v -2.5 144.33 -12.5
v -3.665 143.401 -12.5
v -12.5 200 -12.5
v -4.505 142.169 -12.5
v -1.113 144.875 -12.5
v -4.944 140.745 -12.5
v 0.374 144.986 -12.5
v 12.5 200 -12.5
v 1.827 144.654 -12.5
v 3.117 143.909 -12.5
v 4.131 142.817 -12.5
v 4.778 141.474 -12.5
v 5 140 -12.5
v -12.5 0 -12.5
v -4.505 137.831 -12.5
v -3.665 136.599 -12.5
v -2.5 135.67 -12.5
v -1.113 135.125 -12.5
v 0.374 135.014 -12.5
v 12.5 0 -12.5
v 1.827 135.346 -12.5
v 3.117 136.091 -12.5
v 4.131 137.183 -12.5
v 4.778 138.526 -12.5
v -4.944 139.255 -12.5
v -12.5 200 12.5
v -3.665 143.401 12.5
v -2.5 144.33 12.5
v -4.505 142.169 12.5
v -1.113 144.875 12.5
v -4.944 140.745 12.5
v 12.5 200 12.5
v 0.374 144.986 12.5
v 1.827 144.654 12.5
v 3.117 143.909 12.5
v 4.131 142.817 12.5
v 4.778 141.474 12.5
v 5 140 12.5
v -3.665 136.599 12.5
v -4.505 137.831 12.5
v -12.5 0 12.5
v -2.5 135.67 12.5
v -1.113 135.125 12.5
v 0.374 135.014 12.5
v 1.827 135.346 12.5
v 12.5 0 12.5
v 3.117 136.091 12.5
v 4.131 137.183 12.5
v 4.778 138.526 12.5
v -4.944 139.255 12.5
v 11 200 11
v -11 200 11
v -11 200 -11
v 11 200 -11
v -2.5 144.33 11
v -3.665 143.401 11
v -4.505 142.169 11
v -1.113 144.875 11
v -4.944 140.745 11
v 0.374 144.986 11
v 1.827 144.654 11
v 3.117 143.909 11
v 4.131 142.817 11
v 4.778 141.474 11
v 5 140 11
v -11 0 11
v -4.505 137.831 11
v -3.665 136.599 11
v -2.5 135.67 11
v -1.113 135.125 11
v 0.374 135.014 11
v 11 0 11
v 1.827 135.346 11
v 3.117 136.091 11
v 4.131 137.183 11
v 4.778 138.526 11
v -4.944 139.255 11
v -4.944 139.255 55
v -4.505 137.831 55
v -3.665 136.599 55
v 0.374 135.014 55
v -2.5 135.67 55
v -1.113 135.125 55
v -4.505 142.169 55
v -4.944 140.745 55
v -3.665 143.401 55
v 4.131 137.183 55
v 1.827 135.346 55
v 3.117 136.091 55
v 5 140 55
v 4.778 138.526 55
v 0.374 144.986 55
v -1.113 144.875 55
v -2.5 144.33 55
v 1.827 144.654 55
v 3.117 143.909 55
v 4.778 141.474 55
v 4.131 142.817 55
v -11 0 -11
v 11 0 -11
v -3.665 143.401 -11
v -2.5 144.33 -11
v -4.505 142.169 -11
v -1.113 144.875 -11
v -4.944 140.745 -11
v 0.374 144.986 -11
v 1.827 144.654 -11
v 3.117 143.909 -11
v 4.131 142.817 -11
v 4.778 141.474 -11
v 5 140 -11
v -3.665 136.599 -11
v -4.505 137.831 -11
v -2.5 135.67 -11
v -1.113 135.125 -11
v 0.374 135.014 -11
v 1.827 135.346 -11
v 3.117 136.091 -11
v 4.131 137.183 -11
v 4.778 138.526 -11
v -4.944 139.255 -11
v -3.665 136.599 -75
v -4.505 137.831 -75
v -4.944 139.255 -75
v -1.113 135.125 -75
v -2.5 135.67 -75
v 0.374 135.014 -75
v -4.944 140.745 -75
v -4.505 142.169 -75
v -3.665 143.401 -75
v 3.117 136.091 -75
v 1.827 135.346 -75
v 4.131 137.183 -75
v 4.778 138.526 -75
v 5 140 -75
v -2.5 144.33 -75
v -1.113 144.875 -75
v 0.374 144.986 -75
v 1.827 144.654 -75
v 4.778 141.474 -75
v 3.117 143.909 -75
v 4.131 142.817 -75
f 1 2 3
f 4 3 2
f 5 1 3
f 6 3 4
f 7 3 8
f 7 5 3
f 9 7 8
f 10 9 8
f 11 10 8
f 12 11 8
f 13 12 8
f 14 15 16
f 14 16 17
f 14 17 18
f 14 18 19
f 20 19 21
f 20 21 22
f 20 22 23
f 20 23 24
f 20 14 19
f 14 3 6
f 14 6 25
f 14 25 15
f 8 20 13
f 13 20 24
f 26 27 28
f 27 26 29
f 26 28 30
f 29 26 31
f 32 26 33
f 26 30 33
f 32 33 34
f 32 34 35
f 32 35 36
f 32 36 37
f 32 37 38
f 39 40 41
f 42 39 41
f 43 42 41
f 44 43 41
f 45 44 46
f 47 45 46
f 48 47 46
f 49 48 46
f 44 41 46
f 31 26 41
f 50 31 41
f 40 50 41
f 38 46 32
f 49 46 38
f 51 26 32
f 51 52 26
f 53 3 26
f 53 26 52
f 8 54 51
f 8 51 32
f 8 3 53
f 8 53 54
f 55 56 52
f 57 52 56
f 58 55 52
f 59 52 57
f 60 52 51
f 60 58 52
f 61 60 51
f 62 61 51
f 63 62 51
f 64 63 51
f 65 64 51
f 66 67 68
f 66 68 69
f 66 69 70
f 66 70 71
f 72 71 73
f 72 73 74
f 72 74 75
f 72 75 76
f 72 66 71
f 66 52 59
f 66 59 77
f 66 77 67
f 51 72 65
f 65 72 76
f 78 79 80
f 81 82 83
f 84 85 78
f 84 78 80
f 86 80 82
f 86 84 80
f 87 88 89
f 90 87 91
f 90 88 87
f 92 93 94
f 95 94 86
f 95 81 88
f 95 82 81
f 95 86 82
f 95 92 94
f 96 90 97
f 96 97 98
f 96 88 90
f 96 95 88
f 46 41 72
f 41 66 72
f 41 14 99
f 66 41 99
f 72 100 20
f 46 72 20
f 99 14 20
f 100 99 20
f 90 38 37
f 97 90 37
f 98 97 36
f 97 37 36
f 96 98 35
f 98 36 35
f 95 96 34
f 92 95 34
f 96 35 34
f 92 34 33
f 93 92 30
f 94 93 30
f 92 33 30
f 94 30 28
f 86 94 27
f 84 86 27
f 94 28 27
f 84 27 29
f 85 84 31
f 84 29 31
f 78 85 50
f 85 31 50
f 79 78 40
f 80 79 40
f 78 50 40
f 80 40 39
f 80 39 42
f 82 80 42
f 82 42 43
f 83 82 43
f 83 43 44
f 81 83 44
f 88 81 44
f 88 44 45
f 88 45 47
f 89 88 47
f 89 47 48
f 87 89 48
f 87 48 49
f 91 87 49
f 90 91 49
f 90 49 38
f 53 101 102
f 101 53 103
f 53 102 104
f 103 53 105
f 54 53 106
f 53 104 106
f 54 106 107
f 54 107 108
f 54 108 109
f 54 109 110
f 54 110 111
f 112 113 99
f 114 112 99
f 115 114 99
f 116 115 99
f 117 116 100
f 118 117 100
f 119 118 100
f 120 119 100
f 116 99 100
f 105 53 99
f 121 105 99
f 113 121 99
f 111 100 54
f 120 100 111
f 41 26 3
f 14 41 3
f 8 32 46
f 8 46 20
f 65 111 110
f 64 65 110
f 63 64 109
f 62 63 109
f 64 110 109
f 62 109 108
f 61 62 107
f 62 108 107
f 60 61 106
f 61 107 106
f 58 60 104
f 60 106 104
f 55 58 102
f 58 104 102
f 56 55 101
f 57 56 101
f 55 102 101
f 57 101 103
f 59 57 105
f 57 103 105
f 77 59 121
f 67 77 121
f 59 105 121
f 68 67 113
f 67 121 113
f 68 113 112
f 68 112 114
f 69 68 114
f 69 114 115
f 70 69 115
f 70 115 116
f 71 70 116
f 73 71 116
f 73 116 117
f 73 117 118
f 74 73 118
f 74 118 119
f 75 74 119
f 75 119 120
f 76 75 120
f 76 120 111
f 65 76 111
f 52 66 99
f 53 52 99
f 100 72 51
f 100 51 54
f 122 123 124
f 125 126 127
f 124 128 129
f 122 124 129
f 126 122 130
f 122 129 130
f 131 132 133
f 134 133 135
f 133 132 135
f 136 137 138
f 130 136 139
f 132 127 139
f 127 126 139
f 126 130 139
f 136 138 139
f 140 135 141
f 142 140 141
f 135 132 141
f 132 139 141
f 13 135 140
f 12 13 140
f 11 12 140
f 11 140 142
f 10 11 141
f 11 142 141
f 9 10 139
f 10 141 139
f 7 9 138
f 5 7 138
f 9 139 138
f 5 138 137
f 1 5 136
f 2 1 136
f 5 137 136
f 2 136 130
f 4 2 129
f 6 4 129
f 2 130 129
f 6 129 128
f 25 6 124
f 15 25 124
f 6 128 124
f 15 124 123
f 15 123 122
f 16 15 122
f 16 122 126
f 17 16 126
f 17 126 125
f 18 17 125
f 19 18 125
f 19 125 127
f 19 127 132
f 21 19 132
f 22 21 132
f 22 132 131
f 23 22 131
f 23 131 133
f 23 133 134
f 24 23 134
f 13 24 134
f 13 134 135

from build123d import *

# Parameters (mm, degrees)
SKETCH3_W                = 25
SKETCH3_H                = 25
SKETCH3_W_2              = 22
SKETCH3_H_2              = 22
BOSS_EXTRUDE1_DEPTH      = 200
SKETCH4_R                = 5
CUT_EXTRUDE1_DEPTH       = 25
BOSS_EXTRUDE2_DEPTH      = 55
BOSS_EXTRUDE2_DEPTH_BACK = 75
SKETCH5_R                = 5


with BuildPart() as part:
    # Sketch3 → Boss-Extrude1 (new body)
    with BuildSketch(Plane(origin=(0, 0, 0), x_dir=(1, 0, 0), z_dir=(0, 1, 0))):
        Rectangle(SKETCH3_W, SKETCH3_H)
        Rectangle(SKETCH3_W_2, SKETCH3_H_2, mode=Mode.SUBTRACT)
    extrude(amount=BOSS_EXTRUDE1_DEPTH)

    # Sketch4 → Cut-Extrude1 (cut)
    with BuildSketch(Plane.XY.offset(12.5)):
        with Locations((0, 140)):
            Circle(SKETCH4_R)
    extrude(amount=-CUT_EXTRUDE1_DEPTH, mode=Mode.SUBTRACT)

    # Sketch5 → Boss-Extrude2 (add, two sides: drawn at the far end of the back side and taken through both)
    with BuildSketch(Plane.XY.offset(-BOSS_EXTRUDE2_DEPTH_BACK)):
        with Locations((0, 140)):
            Circle(SKETCH5_R)
    extrude(amount=BOSS_EXTRUDE2_DEPTH + BOSS_EXTRUDE2_DEPTH_BACK)


solid = part.part
